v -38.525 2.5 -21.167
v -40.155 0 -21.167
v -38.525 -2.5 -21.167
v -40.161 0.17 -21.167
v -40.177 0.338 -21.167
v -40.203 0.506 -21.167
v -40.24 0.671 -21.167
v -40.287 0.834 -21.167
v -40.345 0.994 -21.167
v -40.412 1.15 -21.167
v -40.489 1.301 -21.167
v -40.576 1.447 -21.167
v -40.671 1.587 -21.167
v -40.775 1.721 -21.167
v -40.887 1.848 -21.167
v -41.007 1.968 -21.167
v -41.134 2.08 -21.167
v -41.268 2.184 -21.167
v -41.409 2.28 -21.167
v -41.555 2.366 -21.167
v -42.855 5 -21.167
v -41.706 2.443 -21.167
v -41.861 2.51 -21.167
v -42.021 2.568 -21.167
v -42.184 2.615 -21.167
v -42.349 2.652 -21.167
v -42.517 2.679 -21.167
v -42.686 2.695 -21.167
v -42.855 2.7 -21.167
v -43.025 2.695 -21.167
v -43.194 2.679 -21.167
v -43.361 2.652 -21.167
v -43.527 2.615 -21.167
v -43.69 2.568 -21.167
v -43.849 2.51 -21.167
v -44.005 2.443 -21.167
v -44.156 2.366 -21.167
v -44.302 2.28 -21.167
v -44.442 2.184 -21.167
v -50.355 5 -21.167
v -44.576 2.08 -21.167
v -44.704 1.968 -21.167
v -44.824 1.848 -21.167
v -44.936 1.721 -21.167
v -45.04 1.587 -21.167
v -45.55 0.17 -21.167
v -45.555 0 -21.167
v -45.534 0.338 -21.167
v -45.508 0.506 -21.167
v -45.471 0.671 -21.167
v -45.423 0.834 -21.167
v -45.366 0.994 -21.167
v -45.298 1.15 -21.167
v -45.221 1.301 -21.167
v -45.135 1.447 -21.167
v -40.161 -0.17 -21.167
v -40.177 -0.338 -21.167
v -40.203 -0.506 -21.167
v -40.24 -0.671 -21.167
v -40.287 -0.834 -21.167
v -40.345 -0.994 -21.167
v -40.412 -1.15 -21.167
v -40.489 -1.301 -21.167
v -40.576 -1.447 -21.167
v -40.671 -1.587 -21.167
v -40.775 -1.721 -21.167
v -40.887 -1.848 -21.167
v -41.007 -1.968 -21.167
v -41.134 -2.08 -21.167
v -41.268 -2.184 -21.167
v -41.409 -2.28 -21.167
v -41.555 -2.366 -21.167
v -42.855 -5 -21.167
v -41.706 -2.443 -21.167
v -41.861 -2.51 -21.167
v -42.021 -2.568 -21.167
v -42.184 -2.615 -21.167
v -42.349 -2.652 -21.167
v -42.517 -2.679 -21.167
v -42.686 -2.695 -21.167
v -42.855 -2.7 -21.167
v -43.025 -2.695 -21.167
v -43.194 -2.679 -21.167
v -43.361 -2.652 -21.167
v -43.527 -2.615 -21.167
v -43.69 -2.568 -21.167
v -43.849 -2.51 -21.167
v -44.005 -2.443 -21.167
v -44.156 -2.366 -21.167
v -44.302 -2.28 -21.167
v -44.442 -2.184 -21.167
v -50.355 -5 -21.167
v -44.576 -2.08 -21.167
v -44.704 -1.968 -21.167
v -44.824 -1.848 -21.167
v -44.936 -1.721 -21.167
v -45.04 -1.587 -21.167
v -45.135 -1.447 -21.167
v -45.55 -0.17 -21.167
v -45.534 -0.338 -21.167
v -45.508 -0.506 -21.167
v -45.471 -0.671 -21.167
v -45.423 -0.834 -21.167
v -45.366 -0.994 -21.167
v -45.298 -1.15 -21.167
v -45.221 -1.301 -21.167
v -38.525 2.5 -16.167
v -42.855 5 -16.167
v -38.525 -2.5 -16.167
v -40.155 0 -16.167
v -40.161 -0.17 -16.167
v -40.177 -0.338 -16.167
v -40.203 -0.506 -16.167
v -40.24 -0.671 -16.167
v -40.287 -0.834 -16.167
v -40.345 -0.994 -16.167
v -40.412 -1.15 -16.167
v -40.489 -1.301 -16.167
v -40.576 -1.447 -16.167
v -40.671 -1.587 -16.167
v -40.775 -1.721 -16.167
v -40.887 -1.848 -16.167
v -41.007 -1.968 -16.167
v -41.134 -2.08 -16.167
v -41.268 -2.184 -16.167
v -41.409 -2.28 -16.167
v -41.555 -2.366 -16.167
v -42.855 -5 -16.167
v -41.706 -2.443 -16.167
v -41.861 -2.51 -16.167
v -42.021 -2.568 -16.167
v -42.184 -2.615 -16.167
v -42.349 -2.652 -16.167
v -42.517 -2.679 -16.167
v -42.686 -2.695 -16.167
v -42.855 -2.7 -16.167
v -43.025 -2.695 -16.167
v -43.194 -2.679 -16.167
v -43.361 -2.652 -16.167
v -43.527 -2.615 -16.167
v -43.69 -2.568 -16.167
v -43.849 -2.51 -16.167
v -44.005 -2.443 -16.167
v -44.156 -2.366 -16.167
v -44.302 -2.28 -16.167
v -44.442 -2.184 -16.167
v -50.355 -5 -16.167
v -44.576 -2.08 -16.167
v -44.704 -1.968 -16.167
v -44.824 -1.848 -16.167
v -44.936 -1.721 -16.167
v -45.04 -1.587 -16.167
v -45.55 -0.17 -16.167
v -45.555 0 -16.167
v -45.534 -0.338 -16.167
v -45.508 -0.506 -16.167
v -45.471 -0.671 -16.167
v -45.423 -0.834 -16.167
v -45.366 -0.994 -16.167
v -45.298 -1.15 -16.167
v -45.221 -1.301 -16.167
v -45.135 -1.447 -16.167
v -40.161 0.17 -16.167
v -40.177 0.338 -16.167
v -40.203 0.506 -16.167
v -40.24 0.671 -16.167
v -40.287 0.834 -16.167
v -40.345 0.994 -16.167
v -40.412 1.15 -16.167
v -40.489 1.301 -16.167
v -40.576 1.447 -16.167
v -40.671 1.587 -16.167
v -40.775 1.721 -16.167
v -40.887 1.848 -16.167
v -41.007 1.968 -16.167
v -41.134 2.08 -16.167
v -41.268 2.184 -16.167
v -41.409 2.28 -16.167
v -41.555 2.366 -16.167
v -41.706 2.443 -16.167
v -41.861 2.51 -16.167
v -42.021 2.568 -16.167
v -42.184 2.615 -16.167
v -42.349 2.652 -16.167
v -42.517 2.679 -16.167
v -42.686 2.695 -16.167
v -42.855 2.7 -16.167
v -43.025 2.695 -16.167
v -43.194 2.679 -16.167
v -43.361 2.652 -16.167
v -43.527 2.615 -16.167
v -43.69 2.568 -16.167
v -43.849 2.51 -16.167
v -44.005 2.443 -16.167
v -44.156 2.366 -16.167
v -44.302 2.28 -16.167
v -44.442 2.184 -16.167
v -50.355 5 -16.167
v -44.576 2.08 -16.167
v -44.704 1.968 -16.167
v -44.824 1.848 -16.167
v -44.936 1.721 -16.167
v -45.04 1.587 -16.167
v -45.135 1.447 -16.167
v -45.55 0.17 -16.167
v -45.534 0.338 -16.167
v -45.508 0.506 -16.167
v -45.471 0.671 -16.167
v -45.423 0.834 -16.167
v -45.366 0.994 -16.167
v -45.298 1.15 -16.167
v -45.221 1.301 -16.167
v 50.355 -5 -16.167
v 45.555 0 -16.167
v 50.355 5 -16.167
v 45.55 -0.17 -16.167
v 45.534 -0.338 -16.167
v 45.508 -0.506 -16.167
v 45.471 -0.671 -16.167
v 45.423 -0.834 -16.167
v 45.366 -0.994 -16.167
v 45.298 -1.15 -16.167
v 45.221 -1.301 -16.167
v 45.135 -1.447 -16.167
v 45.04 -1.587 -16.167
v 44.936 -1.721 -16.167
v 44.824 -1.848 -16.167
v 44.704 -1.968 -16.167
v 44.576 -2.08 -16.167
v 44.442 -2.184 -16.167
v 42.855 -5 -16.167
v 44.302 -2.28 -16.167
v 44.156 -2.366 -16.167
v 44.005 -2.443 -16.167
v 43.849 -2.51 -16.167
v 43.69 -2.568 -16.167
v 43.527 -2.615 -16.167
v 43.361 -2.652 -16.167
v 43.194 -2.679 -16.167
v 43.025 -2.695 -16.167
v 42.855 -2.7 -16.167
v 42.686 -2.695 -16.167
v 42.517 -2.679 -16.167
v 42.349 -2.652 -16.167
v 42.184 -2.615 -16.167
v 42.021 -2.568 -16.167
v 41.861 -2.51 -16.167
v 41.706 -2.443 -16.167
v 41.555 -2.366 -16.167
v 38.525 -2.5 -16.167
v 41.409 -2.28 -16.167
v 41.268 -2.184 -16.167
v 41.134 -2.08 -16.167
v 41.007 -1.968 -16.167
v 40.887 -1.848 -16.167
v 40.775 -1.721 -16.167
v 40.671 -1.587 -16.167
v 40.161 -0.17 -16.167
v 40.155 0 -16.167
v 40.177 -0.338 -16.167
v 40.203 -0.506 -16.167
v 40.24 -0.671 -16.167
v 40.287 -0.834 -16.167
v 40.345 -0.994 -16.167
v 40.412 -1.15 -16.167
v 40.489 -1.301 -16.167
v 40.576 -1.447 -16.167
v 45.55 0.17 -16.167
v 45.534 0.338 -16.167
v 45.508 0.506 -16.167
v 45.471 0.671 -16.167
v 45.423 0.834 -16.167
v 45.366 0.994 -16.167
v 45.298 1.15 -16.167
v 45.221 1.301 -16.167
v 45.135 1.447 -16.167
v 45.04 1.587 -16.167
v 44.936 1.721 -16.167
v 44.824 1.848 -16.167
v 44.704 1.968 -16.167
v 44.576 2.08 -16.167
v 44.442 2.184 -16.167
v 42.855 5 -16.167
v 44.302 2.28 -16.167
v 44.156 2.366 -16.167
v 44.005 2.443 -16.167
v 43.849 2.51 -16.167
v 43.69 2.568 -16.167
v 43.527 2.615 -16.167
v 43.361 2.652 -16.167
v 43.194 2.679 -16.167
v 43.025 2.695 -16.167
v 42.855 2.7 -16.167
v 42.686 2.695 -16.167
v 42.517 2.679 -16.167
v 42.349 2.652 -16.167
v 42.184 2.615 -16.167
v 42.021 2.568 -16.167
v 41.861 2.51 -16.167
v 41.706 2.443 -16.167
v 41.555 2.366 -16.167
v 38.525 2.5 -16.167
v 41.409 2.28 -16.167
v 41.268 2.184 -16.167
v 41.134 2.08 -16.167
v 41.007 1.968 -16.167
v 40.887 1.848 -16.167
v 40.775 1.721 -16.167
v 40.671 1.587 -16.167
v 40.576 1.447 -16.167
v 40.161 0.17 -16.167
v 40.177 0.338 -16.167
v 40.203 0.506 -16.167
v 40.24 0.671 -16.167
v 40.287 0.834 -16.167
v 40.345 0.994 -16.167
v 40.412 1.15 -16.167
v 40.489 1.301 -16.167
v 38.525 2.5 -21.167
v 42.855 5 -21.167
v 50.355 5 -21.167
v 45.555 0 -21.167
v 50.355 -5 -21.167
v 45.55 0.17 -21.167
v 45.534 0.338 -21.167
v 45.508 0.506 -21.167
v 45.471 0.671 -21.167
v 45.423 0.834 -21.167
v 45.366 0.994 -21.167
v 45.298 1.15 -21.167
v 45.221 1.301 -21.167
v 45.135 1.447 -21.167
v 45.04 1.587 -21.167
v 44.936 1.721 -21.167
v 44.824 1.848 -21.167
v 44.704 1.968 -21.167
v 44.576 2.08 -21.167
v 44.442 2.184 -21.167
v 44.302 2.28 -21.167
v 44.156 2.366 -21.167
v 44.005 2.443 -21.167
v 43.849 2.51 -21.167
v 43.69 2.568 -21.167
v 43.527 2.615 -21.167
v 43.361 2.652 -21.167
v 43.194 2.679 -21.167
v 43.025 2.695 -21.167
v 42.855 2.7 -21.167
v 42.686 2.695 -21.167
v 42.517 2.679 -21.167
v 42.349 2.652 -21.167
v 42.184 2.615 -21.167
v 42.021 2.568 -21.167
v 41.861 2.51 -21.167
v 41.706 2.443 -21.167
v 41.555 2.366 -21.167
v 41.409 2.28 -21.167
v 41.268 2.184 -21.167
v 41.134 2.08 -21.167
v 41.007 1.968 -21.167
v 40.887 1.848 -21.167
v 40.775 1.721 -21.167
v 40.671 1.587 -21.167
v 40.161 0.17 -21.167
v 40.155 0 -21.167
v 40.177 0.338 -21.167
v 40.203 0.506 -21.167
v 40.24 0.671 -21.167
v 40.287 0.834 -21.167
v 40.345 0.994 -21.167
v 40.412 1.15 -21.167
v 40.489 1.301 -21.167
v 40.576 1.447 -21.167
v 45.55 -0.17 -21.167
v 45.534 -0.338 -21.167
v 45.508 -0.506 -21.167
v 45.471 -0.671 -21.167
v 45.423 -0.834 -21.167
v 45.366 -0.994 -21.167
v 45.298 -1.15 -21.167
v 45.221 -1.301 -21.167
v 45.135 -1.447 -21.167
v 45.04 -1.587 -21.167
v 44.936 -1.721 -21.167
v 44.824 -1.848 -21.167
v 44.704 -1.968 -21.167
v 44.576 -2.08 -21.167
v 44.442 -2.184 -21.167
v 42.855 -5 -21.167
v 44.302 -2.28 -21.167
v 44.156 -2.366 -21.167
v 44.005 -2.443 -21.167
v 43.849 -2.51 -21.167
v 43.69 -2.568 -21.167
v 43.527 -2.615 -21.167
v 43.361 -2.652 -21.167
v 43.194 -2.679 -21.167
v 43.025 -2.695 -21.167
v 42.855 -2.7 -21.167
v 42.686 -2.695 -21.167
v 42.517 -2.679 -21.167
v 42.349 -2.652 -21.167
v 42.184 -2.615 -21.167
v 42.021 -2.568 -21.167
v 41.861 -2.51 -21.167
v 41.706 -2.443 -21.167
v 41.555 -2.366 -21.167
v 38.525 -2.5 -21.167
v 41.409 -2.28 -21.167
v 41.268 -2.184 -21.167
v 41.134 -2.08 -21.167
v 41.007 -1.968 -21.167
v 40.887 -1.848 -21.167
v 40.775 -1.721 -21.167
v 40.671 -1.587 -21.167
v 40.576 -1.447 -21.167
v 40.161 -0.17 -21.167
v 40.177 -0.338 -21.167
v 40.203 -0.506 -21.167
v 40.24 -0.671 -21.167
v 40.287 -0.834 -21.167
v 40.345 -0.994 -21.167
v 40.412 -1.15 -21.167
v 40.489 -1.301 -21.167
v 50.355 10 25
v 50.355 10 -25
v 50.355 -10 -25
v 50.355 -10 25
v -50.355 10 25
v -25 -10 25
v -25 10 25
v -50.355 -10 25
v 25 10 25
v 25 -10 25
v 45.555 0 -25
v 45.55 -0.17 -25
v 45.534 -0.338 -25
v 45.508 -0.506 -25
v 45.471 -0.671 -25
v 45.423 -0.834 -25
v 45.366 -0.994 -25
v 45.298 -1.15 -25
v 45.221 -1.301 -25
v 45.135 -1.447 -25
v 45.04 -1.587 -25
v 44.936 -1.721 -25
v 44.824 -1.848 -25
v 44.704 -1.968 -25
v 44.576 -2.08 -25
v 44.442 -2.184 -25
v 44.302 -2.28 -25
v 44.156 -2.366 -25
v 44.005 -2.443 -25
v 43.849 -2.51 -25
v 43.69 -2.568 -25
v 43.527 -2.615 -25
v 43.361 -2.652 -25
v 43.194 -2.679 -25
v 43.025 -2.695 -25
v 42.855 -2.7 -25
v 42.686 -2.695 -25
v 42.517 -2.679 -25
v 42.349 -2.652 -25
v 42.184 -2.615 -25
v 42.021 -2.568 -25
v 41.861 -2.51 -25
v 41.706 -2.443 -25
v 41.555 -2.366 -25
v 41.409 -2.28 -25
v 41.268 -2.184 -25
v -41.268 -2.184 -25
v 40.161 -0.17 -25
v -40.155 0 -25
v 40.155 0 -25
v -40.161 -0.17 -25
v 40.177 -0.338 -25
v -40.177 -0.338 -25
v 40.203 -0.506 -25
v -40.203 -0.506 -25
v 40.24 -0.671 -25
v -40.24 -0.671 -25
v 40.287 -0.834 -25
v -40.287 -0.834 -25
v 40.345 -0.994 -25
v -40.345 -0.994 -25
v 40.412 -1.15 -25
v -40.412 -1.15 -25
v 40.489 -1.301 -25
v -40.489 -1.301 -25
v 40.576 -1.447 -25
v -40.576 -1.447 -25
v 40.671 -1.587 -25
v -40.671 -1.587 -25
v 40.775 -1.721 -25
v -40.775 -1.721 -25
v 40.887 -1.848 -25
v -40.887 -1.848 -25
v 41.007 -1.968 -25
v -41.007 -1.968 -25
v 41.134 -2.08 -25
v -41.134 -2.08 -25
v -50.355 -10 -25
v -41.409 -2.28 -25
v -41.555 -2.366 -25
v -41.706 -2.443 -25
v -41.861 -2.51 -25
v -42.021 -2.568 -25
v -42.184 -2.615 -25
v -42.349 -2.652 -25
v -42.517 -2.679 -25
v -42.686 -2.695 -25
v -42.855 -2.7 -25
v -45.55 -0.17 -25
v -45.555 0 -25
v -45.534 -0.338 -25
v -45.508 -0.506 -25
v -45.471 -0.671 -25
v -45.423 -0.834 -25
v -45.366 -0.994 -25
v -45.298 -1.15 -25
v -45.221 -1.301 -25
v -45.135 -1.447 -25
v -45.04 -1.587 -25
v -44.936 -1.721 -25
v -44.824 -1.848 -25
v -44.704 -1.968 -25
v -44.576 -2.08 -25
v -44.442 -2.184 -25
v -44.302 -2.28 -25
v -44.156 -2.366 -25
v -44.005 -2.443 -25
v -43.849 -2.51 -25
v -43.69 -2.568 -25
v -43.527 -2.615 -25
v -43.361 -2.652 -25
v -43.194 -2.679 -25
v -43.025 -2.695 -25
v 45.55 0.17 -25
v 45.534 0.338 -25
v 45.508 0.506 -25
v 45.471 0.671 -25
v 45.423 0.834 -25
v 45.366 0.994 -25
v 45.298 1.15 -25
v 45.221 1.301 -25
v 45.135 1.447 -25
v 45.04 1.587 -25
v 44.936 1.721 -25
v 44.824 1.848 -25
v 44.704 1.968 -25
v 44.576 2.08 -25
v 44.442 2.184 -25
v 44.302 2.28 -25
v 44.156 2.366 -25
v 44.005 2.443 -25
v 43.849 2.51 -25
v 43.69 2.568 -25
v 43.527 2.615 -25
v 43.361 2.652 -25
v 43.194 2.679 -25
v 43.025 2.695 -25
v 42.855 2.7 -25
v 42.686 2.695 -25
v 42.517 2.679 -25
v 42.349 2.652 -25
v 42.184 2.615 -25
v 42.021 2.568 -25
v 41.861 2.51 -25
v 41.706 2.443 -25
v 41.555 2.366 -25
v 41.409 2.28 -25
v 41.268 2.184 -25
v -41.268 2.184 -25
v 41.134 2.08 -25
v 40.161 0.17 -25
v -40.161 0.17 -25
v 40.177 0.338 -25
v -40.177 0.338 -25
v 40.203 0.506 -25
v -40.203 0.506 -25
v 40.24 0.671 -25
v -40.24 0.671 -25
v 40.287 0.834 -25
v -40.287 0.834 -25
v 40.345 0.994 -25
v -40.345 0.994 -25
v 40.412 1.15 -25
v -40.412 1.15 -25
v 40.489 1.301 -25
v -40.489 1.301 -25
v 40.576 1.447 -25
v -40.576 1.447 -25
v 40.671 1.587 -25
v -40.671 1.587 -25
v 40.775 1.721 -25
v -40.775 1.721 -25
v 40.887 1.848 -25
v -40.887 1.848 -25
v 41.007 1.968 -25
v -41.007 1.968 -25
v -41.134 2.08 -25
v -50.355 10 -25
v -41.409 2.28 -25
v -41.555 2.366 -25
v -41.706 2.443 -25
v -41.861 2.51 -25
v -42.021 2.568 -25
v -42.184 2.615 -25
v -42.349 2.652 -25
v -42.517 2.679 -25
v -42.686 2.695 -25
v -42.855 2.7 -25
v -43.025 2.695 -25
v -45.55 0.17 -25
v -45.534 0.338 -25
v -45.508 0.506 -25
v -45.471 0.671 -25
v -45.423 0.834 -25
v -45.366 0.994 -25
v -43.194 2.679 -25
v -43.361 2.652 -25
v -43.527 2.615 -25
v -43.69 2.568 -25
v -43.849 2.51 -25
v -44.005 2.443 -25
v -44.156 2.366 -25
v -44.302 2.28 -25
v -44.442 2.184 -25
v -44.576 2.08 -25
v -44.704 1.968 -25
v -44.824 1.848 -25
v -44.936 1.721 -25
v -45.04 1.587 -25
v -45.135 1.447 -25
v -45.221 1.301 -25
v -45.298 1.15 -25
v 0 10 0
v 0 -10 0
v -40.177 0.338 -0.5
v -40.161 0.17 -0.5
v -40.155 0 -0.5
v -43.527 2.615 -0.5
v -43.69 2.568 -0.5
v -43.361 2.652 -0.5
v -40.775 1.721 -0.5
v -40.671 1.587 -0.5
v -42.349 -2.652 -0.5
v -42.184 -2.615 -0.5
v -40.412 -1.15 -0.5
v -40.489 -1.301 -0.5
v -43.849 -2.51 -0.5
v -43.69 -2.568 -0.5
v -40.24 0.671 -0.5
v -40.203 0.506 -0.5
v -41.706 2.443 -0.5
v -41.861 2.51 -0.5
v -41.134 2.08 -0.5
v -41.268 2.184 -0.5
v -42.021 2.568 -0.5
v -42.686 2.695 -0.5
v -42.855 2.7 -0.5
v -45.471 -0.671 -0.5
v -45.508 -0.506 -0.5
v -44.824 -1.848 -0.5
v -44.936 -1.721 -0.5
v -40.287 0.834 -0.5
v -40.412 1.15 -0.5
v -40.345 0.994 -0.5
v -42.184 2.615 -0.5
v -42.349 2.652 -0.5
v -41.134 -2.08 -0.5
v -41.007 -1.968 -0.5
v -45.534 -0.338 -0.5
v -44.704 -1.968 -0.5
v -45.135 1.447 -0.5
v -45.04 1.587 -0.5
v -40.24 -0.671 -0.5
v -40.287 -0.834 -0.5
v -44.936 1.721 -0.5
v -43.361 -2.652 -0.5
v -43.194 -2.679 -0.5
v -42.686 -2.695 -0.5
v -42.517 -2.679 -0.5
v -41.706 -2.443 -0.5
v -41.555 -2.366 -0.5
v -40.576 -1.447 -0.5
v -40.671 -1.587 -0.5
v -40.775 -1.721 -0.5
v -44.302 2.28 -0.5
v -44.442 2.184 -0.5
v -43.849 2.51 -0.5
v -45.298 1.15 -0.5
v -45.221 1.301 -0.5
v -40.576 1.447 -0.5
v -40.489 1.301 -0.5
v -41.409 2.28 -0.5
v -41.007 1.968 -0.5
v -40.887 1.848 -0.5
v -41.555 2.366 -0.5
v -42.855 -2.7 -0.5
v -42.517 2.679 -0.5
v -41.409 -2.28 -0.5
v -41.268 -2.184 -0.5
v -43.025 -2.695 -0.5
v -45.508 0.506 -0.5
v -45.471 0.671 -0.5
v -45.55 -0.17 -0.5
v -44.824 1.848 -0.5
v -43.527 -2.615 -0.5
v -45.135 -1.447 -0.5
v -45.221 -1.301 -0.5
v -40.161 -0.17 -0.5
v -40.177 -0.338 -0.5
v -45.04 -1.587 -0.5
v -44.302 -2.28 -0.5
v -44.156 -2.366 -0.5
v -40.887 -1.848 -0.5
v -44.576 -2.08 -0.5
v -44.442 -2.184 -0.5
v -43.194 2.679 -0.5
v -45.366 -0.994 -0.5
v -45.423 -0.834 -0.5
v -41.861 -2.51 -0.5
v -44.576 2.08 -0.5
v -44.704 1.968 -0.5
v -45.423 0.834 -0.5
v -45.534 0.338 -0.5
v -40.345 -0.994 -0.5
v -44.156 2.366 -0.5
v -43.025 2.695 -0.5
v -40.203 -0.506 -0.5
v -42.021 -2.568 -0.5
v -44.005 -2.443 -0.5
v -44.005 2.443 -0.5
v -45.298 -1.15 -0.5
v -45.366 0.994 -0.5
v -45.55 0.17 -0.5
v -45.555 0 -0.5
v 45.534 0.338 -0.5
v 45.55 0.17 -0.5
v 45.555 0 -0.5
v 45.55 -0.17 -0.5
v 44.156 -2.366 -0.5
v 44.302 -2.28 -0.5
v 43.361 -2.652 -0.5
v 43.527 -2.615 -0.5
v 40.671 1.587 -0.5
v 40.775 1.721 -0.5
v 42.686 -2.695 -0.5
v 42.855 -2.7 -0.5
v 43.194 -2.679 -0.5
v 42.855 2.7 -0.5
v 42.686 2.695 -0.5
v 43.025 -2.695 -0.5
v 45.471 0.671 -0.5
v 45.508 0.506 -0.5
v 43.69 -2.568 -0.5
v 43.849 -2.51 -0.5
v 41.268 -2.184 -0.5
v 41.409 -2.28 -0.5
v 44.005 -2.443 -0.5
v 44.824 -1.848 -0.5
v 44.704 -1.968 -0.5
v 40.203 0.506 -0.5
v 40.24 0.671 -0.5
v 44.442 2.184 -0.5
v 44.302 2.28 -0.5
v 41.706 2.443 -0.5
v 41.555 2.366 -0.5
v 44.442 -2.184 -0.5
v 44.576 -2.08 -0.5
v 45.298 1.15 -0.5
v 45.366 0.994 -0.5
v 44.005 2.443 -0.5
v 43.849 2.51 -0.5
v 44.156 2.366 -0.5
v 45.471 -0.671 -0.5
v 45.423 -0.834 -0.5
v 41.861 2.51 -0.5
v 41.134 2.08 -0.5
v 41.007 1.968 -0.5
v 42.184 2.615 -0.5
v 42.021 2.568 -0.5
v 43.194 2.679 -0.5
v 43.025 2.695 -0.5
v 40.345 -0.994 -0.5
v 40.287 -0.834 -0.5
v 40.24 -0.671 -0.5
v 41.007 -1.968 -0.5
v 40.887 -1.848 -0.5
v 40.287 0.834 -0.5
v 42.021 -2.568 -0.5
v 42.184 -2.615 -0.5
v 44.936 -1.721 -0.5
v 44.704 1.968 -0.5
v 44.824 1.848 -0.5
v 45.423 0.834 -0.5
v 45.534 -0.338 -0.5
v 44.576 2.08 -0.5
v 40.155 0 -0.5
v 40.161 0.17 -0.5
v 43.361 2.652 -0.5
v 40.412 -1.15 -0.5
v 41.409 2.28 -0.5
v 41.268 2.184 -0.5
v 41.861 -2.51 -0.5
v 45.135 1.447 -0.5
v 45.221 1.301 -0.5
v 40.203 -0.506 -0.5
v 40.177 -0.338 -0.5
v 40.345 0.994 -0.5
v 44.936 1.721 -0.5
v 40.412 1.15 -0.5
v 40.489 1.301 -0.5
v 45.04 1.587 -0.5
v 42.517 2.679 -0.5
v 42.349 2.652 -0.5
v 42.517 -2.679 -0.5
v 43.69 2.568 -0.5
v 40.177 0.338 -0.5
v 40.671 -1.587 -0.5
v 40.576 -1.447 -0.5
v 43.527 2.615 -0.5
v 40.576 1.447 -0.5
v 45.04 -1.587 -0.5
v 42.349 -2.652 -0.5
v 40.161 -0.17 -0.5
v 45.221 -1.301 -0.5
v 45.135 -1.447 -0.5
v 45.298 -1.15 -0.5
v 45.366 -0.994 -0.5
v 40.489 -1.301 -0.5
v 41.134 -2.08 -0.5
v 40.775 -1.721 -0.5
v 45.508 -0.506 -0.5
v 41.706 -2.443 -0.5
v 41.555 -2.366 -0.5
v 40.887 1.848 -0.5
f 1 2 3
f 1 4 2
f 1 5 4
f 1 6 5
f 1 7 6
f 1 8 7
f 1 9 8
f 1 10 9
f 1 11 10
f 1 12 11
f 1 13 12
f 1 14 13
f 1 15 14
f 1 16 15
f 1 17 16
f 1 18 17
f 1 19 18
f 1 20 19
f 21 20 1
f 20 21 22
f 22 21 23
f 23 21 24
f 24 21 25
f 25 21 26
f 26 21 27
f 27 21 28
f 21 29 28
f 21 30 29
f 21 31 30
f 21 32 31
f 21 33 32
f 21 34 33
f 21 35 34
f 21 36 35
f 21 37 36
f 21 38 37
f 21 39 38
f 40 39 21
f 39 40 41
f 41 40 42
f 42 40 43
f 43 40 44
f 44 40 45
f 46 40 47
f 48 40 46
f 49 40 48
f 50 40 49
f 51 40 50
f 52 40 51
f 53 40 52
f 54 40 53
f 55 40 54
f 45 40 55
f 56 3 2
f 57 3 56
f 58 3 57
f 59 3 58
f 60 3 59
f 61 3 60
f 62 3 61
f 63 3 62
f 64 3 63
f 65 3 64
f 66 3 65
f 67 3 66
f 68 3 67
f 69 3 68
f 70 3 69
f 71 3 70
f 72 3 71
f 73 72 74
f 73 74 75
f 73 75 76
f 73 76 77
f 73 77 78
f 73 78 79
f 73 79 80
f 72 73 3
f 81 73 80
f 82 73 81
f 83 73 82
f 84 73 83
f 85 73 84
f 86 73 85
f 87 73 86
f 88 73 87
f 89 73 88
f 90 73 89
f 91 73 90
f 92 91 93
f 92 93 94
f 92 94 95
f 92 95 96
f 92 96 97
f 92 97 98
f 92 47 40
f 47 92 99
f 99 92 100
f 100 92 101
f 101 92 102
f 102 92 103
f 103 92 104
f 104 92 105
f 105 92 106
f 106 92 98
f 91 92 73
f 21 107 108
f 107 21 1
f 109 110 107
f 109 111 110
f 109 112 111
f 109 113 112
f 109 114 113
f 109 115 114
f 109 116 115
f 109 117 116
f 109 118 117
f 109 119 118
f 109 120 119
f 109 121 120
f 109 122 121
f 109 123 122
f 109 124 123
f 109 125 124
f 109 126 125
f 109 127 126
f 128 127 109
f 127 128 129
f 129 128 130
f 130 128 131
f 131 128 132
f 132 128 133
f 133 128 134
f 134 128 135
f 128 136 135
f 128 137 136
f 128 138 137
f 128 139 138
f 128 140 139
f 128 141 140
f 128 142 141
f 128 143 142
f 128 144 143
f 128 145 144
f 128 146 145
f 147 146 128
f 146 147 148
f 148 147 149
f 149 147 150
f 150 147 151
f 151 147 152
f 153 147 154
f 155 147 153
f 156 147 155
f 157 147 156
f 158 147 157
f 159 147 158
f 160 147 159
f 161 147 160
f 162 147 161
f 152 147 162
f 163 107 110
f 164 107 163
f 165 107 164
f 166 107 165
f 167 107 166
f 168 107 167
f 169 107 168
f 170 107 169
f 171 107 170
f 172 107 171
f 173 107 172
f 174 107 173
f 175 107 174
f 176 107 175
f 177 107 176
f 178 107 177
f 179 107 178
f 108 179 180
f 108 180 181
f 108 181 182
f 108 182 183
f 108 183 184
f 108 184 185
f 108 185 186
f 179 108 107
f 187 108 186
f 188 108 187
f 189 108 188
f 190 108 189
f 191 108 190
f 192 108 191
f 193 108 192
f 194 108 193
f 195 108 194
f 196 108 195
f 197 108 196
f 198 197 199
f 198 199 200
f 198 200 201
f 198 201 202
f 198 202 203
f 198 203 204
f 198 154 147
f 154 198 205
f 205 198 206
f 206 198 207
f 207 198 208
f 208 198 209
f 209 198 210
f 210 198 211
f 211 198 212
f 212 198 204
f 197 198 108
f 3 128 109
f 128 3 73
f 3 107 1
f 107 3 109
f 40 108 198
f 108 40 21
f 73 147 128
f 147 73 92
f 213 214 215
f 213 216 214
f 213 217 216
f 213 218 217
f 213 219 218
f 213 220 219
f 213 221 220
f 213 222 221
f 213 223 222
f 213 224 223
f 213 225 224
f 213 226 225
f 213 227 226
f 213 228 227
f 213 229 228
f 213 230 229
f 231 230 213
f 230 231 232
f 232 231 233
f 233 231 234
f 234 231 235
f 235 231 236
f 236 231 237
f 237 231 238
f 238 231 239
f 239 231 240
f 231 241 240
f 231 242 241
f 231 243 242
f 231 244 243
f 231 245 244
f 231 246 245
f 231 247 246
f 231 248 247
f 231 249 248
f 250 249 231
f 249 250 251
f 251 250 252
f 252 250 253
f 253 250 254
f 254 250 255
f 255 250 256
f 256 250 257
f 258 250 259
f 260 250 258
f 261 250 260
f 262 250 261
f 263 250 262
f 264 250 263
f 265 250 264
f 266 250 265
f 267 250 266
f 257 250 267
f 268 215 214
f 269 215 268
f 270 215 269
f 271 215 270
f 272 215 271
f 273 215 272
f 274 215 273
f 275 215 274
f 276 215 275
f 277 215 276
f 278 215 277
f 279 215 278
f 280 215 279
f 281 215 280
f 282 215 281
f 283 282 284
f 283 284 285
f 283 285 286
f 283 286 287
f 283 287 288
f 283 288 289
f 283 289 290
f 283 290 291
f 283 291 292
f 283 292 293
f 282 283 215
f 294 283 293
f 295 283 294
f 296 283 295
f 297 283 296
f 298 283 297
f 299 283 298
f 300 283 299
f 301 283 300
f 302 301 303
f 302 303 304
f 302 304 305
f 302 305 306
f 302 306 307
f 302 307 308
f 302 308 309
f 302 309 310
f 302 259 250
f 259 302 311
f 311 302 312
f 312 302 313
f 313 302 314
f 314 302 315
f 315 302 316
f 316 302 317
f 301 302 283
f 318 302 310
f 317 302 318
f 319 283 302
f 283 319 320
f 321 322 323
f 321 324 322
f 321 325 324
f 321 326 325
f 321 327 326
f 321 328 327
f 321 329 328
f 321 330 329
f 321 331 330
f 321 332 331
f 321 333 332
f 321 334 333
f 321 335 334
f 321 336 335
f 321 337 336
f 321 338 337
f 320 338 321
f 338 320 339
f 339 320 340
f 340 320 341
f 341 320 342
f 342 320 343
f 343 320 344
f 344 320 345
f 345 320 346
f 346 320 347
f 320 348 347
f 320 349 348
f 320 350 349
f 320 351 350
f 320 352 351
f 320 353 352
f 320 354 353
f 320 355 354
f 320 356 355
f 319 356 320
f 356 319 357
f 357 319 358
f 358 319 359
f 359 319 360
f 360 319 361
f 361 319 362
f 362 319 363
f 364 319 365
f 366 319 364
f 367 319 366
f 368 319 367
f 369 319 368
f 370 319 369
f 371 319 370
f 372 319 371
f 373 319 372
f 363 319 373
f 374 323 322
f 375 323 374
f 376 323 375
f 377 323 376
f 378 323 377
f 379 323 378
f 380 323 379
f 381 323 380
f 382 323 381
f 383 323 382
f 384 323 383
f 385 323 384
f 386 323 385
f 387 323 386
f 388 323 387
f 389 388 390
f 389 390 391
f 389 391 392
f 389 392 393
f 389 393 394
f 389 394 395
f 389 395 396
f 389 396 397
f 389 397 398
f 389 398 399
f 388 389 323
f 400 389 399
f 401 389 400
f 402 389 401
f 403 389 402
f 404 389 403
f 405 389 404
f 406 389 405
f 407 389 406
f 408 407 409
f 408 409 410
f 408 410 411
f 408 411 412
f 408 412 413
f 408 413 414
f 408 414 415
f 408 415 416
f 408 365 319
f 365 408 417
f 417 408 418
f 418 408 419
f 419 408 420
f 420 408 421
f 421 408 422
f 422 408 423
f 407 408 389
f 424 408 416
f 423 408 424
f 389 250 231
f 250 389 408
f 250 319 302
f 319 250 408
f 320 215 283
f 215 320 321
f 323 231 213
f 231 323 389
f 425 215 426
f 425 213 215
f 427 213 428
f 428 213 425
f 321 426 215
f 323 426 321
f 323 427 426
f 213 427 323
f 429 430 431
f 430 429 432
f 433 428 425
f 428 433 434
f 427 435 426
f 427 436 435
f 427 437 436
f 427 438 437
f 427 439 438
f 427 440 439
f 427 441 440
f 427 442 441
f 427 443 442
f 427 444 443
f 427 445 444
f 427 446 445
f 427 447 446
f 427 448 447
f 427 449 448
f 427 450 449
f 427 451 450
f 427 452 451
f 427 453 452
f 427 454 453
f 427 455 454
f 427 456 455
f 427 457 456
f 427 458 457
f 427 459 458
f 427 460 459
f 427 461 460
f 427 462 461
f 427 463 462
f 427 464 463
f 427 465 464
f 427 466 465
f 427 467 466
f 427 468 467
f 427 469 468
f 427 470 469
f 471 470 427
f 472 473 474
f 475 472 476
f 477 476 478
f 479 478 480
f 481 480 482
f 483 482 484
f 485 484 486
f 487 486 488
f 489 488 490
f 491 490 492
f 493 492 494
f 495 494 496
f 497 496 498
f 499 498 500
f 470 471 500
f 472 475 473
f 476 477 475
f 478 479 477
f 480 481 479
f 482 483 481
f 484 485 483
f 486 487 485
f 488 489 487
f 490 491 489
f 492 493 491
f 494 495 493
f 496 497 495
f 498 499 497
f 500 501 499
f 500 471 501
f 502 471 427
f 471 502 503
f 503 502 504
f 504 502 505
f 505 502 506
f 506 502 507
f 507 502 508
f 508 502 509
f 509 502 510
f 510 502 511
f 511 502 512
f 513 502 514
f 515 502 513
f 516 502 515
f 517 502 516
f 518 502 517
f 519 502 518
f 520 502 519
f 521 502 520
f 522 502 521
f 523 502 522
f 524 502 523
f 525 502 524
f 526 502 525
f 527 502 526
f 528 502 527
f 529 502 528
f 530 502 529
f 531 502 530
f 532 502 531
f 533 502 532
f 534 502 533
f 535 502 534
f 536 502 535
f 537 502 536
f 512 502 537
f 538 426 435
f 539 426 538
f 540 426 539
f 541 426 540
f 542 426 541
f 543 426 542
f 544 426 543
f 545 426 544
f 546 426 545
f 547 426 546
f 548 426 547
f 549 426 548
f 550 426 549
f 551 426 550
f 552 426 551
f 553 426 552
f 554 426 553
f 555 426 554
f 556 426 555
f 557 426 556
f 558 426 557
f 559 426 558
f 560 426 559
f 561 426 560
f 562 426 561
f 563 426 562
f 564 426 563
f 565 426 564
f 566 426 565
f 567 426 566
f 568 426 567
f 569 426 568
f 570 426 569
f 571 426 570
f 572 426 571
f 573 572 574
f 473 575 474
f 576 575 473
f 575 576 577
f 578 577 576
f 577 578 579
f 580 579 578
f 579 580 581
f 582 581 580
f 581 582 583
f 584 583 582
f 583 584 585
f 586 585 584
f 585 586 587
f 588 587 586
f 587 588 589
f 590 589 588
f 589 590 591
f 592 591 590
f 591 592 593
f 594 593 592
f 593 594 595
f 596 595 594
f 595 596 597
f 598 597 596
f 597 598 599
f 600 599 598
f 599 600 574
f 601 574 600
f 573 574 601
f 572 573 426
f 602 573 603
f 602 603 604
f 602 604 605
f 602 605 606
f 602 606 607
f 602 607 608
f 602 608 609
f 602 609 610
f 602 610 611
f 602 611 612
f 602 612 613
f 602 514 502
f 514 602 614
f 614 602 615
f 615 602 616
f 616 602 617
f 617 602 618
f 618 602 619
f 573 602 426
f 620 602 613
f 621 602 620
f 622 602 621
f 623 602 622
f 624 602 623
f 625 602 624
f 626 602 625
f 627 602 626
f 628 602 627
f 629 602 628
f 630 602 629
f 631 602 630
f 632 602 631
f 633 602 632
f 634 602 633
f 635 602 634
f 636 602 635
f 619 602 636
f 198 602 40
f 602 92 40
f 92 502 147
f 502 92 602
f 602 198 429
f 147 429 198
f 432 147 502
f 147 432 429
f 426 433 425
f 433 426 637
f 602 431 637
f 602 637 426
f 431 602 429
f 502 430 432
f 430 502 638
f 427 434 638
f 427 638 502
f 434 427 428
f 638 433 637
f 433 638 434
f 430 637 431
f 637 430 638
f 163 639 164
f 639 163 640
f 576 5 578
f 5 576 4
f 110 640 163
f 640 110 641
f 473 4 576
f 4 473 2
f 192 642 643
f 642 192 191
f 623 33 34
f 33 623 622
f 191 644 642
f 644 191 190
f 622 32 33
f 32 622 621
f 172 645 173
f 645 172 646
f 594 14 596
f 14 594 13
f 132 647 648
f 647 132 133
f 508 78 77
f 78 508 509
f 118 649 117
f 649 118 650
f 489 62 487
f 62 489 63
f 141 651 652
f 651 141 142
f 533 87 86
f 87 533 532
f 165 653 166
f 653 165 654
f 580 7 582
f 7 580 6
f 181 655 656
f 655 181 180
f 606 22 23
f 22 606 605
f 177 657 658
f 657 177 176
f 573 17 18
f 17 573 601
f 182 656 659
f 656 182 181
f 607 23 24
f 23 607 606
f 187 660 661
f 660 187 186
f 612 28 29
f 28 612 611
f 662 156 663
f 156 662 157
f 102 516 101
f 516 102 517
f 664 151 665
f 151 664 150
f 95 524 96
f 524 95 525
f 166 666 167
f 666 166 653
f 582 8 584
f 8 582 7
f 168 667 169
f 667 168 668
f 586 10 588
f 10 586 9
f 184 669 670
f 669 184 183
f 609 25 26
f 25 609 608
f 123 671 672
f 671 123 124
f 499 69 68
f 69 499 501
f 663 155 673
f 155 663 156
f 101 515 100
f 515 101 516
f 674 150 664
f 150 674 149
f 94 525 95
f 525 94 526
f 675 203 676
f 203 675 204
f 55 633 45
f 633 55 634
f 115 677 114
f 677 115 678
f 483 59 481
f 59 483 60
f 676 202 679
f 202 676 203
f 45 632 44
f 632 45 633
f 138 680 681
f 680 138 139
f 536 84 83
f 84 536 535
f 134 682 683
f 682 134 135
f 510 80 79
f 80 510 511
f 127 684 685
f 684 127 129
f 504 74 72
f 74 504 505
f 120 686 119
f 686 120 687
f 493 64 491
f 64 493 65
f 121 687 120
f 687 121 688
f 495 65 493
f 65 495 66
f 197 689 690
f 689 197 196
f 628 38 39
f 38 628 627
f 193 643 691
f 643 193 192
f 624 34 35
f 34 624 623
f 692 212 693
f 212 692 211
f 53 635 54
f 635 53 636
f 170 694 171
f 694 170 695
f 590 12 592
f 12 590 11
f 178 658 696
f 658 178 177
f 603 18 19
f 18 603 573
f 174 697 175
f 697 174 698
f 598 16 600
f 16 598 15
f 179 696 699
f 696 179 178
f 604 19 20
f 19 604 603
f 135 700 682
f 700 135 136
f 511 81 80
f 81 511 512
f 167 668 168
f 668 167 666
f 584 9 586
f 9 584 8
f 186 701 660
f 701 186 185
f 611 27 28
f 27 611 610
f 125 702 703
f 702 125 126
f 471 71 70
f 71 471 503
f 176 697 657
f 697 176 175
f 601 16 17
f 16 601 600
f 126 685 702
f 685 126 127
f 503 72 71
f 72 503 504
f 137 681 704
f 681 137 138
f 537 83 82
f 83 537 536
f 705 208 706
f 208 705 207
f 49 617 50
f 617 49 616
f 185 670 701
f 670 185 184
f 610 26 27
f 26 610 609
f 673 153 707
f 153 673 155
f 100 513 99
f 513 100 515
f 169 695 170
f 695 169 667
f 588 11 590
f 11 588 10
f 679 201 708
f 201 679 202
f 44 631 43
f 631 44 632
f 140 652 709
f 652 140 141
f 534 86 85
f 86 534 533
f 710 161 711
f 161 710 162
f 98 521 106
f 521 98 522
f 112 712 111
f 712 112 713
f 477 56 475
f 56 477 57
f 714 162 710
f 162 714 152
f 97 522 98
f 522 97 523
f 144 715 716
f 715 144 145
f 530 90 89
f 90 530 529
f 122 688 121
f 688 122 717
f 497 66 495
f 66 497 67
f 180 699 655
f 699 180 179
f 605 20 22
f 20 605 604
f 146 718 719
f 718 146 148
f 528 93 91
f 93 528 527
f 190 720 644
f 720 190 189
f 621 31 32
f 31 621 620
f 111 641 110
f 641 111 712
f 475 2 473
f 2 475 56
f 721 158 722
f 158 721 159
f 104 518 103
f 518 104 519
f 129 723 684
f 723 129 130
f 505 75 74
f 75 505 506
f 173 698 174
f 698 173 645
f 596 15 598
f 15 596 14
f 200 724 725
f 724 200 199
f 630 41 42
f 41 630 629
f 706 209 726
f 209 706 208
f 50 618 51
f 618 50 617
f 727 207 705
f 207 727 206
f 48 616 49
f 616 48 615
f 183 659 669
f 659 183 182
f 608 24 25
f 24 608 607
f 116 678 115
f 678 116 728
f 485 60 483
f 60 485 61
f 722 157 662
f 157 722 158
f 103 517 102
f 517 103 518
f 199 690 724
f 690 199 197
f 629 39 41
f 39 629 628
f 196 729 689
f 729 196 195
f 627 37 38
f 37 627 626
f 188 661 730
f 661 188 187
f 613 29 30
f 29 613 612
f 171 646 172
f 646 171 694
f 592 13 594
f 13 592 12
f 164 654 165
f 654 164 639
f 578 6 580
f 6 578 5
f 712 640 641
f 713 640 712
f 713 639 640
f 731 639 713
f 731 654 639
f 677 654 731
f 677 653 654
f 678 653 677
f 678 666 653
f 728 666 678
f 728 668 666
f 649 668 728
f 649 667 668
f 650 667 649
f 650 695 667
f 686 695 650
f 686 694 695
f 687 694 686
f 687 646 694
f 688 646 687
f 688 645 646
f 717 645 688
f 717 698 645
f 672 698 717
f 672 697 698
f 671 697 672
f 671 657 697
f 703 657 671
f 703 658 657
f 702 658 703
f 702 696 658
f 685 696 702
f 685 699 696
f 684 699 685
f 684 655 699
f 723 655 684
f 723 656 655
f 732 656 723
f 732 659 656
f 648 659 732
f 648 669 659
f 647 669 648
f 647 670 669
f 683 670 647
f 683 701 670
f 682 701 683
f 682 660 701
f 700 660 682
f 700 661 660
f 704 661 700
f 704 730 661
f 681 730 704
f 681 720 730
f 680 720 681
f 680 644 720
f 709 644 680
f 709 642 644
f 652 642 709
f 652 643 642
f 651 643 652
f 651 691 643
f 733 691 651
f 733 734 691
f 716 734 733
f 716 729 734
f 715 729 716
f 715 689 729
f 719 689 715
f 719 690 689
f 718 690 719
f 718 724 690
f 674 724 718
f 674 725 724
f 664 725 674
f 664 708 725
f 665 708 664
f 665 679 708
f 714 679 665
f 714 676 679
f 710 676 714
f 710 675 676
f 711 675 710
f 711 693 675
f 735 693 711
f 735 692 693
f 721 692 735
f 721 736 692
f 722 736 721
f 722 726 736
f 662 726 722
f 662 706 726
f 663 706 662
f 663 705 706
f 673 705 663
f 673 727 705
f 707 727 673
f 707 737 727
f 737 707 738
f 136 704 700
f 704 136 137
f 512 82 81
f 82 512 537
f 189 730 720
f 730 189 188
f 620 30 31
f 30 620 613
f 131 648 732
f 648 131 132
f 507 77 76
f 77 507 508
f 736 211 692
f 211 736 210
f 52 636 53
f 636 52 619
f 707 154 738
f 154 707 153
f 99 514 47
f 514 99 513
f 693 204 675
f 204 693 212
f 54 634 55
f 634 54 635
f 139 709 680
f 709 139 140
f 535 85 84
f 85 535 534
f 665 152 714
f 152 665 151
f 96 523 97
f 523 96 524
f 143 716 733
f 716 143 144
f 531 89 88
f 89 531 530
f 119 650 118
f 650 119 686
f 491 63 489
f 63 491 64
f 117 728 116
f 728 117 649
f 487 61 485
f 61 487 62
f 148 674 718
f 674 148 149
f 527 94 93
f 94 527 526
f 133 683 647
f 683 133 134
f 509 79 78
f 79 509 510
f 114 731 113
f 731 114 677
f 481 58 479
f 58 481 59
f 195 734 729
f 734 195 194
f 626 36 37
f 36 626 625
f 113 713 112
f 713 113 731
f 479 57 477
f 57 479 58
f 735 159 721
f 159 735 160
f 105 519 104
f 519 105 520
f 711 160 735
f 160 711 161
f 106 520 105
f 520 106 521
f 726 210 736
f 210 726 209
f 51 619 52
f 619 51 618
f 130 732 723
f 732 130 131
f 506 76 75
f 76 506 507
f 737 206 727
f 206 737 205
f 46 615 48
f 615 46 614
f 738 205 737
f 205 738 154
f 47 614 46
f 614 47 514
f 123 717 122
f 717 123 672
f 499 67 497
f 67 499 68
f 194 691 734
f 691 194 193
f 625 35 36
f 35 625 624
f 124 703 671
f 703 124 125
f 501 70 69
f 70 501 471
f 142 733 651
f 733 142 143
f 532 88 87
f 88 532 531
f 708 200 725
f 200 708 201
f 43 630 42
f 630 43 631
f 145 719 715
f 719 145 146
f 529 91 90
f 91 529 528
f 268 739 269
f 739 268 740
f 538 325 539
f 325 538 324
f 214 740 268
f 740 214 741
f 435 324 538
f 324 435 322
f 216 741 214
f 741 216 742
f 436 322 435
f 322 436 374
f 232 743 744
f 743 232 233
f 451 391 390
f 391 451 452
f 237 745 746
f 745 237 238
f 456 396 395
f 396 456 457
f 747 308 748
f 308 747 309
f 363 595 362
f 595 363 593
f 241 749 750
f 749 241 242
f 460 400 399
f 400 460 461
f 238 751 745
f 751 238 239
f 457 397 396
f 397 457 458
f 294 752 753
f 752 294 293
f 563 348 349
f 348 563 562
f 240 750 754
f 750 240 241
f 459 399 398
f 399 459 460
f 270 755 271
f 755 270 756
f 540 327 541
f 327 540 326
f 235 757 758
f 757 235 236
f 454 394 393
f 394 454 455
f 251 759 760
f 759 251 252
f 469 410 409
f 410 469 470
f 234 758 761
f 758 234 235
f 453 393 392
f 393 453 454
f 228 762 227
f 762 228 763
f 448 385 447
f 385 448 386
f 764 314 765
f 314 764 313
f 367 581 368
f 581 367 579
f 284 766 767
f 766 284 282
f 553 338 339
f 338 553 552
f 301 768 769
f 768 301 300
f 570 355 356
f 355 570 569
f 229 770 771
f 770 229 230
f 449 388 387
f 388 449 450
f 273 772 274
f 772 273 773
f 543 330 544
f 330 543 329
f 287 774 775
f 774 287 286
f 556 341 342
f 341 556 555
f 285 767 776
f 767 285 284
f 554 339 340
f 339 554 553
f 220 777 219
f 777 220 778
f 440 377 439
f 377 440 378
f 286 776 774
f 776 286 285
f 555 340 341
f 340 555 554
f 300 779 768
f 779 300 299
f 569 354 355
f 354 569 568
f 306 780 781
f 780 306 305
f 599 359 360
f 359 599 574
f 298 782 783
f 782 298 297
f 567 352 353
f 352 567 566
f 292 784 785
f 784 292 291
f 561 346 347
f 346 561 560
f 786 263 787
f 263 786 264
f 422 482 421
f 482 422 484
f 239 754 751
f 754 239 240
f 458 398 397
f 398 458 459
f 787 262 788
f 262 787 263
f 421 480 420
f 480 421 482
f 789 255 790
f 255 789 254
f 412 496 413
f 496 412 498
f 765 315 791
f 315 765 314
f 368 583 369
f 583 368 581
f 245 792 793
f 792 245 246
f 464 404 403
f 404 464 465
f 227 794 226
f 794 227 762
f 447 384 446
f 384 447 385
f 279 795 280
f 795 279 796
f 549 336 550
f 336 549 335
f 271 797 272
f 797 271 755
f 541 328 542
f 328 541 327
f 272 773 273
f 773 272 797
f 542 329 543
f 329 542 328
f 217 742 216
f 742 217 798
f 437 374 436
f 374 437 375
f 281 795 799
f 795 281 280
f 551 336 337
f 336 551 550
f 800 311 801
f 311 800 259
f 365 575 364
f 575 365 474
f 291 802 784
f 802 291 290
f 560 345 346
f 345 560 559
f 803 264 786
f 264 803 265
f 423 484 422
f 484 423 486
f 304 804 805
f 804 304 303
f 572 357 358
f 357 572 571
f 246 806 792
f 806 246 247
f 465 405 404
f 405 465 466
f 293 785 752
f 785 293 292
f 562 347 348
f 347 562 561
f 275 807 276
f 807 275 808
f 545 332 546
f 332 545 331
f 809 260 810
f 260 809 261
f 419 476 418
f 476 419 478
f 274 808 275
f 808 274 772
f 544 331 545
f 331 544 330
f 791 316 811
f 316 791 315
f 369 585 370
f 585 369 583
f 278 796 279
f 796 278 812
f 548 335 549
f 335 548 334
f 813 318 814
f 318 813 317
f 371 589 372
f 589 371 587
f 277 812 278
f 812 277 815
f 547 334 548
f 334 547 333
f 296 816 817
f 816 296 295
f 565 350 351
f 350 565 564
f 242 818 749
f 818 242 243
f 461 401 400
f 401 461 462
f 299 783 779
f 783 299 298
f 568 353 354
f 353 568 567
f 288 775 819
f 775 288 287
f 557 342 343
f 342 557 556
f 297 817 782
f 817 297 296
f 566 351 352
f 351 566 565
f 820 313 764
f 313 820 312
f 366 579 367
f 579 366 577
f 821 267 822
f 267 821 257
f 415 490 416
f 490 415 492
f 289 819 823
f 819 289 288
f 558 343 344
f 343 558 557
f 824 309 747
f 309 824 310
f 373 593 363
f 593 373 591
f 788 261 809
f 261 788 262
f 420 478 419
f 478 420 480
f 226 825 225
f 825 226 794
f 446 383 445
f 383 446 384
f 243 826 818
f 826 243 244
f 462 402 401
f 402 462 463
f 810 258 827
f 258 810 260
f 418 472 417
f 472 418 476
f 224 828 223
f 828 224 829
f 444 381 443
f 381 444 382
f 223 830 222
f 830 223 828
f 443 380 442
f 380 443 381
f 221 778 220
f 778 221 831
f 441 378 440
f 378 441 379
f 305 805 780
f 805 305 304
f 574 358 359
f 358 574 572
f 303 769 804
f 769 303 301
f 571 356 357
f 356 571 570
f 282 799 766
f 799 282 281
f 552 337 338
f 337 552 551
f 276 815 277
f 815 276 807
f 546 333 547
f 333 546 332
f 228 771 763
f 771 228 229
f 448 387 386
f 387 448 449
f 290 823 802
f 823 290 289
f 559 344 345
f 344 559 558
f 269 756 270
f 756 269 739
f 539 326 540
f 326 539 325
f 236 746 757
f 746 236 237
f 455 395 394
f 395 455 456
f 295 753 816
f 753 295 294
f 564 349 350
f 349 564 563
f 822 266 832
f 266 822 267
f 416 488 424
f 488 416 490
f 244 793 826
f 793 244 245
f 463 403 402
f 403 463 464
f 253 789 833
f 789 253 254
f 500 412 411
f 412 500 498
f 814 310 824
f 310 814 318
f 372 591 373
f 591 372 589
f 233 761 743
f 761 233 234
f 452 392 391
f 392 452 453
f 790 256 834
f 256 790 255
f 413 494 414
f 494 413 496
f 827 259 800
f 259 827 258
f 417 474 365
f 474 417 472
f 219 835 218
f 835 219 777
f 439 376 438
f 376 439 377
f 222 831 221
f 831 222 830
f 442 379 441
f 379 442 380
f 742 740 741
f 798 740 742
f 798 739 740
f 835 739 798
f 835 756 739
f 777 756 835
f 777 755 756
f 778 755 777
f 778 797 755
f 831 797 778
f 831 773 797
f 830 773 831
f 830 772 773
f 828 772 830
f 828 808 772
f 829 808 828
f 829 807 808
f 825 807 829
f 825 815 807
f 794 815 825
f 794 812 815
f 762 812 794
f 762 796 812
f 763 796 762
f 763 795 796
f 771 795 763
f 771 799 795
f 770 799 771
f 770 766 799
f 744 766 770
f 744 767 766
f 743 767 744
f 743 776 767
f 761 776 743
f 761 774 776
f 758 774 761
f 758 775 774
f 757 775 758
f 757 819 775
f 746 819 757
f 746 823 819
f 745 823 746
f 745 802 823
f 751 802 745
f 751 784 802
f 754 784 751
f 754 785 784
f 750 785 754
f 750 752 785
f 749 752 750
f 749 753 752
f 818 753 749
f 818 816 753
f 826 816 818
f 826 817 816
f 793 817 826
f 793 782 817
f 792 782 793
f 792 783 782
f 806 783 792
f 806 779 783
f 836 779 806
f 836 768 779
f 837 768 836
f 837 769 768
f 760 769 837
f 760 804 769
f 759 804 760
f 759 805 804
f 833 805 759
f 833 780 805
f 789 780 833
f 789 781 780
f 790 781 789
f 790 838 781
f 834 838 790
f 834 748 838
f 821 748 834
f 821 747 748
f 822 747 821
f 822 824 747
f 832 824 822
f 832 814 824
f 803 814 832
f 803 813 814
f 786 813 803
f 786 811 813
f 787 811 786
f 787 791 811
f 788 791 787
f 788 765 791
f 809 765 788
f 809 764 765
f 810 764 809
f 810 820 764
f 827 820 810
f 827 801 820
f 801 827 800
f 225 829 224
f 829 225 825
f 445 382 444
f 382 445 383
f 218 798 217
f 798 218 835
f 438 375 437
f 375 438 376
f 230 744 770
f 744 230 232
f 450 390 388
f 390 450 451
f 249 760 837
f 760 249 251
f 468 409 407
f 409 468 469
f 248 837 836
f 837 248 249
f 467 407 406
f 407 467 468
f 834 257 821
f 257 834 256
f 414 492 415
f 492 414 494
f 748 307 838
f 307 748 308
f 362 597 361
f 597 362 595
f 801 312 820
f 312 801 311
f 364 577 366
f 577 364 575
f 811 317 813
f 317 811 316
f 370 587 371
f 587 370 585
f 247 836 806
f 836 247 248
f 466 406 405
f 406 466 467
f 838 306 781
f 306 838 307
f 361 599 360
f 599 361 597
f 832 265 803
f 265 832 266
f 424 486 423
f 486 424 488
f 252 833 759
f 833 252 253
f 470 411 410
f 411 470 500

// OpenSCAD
$fn=100;
tuborect=50;
espesor=20;
ancho=2*tuborect*cos(45)+2*15;
alto=50;

Set_Screw_Diameter=5; //[2:10]
//Set Screw Nut Diameter
Set_Screw_Nut_Diameter=9; //[4:20]
//Set Screw Nut Thickness
Set_Screw_Nut_Thickness=4; //[2:10]
Set_Screw_Largo=28; //[2:10]
//-------------------------------
a=Set_Screw_Diameter; //[2:10]
//Set Screw Nut Diameter
b=Set_Screw_Nut_Diameter; //[4:20]
//Set Screw Nut Thickness
c=Set_Screw_Nut_Thickness; //[2:10]
d=Set_Screw_Largo;

pie();
//apoyo_inf();
//apoyo_sup();
module pie(){
difference(){
cube([ancho,espesor,alto],center=true);
translate([0,0,50*cos(45)])
rotate([0,45,0])
cube(50,center=true);

translate([-tuborect*cos(45)-15/2,0,-alto/2-d/8])
cylinder(d,a/2+0.2,a/2+0.2);
translate([-tuborect*cos(45)-15/2,0,-alto/3-c/2])
rotate([-90,0,90])
#nuttrap();

translate([tuborect*cos(45)+15/2,0,-alto/2-d/8])
cylinder(d,a/2+0.2,a/2+0.2);
translate([tuborect*cos(45)+15/2,0,-alto/3-c/2])
rotate([90,0,90])
#nuttrap();}
}
module apoyo_inf(){
difference(){
cylinder(c,b,b,center=true);
hexagon(c,b/2+0.2);
}}
module apoyo_sup(){
difference (){
cylinder(c,b,b,center=true);
translate([0,0,-c])
hexagon(c,b/2+0.2);
cylinder(c,a/2+0.2,a/2+0.2);
}}

module nuttrap(){
translate([0,(c+1)/2,0])rotate([90,0,0])hexagon(c+1,(b+1)/2);
translate([0,0,(b*3)/2])cube([b+1,c+1,b*3],center = true);
}
module hexagon(height,radius) 
{
  linear_extrude(height=height) hexagonf(radius);
}

module hexagonf(radius)
{
  reg_polygon(6,radius);
}
module reg_polygon(sides,radius)
{
  function dia(r) = sqrt(pow(r*2,2)/2);  //sqrt((r*2^2)/2) if only we had an exponention op
  if(sides<2) square([radius,0]);
  if(sides==3) triangle(radius);
  if(sides==4) square([dia(radius),dia(radius)],center=true);
  if(sides>4) circle(r=radius,$fn=sides);
}
